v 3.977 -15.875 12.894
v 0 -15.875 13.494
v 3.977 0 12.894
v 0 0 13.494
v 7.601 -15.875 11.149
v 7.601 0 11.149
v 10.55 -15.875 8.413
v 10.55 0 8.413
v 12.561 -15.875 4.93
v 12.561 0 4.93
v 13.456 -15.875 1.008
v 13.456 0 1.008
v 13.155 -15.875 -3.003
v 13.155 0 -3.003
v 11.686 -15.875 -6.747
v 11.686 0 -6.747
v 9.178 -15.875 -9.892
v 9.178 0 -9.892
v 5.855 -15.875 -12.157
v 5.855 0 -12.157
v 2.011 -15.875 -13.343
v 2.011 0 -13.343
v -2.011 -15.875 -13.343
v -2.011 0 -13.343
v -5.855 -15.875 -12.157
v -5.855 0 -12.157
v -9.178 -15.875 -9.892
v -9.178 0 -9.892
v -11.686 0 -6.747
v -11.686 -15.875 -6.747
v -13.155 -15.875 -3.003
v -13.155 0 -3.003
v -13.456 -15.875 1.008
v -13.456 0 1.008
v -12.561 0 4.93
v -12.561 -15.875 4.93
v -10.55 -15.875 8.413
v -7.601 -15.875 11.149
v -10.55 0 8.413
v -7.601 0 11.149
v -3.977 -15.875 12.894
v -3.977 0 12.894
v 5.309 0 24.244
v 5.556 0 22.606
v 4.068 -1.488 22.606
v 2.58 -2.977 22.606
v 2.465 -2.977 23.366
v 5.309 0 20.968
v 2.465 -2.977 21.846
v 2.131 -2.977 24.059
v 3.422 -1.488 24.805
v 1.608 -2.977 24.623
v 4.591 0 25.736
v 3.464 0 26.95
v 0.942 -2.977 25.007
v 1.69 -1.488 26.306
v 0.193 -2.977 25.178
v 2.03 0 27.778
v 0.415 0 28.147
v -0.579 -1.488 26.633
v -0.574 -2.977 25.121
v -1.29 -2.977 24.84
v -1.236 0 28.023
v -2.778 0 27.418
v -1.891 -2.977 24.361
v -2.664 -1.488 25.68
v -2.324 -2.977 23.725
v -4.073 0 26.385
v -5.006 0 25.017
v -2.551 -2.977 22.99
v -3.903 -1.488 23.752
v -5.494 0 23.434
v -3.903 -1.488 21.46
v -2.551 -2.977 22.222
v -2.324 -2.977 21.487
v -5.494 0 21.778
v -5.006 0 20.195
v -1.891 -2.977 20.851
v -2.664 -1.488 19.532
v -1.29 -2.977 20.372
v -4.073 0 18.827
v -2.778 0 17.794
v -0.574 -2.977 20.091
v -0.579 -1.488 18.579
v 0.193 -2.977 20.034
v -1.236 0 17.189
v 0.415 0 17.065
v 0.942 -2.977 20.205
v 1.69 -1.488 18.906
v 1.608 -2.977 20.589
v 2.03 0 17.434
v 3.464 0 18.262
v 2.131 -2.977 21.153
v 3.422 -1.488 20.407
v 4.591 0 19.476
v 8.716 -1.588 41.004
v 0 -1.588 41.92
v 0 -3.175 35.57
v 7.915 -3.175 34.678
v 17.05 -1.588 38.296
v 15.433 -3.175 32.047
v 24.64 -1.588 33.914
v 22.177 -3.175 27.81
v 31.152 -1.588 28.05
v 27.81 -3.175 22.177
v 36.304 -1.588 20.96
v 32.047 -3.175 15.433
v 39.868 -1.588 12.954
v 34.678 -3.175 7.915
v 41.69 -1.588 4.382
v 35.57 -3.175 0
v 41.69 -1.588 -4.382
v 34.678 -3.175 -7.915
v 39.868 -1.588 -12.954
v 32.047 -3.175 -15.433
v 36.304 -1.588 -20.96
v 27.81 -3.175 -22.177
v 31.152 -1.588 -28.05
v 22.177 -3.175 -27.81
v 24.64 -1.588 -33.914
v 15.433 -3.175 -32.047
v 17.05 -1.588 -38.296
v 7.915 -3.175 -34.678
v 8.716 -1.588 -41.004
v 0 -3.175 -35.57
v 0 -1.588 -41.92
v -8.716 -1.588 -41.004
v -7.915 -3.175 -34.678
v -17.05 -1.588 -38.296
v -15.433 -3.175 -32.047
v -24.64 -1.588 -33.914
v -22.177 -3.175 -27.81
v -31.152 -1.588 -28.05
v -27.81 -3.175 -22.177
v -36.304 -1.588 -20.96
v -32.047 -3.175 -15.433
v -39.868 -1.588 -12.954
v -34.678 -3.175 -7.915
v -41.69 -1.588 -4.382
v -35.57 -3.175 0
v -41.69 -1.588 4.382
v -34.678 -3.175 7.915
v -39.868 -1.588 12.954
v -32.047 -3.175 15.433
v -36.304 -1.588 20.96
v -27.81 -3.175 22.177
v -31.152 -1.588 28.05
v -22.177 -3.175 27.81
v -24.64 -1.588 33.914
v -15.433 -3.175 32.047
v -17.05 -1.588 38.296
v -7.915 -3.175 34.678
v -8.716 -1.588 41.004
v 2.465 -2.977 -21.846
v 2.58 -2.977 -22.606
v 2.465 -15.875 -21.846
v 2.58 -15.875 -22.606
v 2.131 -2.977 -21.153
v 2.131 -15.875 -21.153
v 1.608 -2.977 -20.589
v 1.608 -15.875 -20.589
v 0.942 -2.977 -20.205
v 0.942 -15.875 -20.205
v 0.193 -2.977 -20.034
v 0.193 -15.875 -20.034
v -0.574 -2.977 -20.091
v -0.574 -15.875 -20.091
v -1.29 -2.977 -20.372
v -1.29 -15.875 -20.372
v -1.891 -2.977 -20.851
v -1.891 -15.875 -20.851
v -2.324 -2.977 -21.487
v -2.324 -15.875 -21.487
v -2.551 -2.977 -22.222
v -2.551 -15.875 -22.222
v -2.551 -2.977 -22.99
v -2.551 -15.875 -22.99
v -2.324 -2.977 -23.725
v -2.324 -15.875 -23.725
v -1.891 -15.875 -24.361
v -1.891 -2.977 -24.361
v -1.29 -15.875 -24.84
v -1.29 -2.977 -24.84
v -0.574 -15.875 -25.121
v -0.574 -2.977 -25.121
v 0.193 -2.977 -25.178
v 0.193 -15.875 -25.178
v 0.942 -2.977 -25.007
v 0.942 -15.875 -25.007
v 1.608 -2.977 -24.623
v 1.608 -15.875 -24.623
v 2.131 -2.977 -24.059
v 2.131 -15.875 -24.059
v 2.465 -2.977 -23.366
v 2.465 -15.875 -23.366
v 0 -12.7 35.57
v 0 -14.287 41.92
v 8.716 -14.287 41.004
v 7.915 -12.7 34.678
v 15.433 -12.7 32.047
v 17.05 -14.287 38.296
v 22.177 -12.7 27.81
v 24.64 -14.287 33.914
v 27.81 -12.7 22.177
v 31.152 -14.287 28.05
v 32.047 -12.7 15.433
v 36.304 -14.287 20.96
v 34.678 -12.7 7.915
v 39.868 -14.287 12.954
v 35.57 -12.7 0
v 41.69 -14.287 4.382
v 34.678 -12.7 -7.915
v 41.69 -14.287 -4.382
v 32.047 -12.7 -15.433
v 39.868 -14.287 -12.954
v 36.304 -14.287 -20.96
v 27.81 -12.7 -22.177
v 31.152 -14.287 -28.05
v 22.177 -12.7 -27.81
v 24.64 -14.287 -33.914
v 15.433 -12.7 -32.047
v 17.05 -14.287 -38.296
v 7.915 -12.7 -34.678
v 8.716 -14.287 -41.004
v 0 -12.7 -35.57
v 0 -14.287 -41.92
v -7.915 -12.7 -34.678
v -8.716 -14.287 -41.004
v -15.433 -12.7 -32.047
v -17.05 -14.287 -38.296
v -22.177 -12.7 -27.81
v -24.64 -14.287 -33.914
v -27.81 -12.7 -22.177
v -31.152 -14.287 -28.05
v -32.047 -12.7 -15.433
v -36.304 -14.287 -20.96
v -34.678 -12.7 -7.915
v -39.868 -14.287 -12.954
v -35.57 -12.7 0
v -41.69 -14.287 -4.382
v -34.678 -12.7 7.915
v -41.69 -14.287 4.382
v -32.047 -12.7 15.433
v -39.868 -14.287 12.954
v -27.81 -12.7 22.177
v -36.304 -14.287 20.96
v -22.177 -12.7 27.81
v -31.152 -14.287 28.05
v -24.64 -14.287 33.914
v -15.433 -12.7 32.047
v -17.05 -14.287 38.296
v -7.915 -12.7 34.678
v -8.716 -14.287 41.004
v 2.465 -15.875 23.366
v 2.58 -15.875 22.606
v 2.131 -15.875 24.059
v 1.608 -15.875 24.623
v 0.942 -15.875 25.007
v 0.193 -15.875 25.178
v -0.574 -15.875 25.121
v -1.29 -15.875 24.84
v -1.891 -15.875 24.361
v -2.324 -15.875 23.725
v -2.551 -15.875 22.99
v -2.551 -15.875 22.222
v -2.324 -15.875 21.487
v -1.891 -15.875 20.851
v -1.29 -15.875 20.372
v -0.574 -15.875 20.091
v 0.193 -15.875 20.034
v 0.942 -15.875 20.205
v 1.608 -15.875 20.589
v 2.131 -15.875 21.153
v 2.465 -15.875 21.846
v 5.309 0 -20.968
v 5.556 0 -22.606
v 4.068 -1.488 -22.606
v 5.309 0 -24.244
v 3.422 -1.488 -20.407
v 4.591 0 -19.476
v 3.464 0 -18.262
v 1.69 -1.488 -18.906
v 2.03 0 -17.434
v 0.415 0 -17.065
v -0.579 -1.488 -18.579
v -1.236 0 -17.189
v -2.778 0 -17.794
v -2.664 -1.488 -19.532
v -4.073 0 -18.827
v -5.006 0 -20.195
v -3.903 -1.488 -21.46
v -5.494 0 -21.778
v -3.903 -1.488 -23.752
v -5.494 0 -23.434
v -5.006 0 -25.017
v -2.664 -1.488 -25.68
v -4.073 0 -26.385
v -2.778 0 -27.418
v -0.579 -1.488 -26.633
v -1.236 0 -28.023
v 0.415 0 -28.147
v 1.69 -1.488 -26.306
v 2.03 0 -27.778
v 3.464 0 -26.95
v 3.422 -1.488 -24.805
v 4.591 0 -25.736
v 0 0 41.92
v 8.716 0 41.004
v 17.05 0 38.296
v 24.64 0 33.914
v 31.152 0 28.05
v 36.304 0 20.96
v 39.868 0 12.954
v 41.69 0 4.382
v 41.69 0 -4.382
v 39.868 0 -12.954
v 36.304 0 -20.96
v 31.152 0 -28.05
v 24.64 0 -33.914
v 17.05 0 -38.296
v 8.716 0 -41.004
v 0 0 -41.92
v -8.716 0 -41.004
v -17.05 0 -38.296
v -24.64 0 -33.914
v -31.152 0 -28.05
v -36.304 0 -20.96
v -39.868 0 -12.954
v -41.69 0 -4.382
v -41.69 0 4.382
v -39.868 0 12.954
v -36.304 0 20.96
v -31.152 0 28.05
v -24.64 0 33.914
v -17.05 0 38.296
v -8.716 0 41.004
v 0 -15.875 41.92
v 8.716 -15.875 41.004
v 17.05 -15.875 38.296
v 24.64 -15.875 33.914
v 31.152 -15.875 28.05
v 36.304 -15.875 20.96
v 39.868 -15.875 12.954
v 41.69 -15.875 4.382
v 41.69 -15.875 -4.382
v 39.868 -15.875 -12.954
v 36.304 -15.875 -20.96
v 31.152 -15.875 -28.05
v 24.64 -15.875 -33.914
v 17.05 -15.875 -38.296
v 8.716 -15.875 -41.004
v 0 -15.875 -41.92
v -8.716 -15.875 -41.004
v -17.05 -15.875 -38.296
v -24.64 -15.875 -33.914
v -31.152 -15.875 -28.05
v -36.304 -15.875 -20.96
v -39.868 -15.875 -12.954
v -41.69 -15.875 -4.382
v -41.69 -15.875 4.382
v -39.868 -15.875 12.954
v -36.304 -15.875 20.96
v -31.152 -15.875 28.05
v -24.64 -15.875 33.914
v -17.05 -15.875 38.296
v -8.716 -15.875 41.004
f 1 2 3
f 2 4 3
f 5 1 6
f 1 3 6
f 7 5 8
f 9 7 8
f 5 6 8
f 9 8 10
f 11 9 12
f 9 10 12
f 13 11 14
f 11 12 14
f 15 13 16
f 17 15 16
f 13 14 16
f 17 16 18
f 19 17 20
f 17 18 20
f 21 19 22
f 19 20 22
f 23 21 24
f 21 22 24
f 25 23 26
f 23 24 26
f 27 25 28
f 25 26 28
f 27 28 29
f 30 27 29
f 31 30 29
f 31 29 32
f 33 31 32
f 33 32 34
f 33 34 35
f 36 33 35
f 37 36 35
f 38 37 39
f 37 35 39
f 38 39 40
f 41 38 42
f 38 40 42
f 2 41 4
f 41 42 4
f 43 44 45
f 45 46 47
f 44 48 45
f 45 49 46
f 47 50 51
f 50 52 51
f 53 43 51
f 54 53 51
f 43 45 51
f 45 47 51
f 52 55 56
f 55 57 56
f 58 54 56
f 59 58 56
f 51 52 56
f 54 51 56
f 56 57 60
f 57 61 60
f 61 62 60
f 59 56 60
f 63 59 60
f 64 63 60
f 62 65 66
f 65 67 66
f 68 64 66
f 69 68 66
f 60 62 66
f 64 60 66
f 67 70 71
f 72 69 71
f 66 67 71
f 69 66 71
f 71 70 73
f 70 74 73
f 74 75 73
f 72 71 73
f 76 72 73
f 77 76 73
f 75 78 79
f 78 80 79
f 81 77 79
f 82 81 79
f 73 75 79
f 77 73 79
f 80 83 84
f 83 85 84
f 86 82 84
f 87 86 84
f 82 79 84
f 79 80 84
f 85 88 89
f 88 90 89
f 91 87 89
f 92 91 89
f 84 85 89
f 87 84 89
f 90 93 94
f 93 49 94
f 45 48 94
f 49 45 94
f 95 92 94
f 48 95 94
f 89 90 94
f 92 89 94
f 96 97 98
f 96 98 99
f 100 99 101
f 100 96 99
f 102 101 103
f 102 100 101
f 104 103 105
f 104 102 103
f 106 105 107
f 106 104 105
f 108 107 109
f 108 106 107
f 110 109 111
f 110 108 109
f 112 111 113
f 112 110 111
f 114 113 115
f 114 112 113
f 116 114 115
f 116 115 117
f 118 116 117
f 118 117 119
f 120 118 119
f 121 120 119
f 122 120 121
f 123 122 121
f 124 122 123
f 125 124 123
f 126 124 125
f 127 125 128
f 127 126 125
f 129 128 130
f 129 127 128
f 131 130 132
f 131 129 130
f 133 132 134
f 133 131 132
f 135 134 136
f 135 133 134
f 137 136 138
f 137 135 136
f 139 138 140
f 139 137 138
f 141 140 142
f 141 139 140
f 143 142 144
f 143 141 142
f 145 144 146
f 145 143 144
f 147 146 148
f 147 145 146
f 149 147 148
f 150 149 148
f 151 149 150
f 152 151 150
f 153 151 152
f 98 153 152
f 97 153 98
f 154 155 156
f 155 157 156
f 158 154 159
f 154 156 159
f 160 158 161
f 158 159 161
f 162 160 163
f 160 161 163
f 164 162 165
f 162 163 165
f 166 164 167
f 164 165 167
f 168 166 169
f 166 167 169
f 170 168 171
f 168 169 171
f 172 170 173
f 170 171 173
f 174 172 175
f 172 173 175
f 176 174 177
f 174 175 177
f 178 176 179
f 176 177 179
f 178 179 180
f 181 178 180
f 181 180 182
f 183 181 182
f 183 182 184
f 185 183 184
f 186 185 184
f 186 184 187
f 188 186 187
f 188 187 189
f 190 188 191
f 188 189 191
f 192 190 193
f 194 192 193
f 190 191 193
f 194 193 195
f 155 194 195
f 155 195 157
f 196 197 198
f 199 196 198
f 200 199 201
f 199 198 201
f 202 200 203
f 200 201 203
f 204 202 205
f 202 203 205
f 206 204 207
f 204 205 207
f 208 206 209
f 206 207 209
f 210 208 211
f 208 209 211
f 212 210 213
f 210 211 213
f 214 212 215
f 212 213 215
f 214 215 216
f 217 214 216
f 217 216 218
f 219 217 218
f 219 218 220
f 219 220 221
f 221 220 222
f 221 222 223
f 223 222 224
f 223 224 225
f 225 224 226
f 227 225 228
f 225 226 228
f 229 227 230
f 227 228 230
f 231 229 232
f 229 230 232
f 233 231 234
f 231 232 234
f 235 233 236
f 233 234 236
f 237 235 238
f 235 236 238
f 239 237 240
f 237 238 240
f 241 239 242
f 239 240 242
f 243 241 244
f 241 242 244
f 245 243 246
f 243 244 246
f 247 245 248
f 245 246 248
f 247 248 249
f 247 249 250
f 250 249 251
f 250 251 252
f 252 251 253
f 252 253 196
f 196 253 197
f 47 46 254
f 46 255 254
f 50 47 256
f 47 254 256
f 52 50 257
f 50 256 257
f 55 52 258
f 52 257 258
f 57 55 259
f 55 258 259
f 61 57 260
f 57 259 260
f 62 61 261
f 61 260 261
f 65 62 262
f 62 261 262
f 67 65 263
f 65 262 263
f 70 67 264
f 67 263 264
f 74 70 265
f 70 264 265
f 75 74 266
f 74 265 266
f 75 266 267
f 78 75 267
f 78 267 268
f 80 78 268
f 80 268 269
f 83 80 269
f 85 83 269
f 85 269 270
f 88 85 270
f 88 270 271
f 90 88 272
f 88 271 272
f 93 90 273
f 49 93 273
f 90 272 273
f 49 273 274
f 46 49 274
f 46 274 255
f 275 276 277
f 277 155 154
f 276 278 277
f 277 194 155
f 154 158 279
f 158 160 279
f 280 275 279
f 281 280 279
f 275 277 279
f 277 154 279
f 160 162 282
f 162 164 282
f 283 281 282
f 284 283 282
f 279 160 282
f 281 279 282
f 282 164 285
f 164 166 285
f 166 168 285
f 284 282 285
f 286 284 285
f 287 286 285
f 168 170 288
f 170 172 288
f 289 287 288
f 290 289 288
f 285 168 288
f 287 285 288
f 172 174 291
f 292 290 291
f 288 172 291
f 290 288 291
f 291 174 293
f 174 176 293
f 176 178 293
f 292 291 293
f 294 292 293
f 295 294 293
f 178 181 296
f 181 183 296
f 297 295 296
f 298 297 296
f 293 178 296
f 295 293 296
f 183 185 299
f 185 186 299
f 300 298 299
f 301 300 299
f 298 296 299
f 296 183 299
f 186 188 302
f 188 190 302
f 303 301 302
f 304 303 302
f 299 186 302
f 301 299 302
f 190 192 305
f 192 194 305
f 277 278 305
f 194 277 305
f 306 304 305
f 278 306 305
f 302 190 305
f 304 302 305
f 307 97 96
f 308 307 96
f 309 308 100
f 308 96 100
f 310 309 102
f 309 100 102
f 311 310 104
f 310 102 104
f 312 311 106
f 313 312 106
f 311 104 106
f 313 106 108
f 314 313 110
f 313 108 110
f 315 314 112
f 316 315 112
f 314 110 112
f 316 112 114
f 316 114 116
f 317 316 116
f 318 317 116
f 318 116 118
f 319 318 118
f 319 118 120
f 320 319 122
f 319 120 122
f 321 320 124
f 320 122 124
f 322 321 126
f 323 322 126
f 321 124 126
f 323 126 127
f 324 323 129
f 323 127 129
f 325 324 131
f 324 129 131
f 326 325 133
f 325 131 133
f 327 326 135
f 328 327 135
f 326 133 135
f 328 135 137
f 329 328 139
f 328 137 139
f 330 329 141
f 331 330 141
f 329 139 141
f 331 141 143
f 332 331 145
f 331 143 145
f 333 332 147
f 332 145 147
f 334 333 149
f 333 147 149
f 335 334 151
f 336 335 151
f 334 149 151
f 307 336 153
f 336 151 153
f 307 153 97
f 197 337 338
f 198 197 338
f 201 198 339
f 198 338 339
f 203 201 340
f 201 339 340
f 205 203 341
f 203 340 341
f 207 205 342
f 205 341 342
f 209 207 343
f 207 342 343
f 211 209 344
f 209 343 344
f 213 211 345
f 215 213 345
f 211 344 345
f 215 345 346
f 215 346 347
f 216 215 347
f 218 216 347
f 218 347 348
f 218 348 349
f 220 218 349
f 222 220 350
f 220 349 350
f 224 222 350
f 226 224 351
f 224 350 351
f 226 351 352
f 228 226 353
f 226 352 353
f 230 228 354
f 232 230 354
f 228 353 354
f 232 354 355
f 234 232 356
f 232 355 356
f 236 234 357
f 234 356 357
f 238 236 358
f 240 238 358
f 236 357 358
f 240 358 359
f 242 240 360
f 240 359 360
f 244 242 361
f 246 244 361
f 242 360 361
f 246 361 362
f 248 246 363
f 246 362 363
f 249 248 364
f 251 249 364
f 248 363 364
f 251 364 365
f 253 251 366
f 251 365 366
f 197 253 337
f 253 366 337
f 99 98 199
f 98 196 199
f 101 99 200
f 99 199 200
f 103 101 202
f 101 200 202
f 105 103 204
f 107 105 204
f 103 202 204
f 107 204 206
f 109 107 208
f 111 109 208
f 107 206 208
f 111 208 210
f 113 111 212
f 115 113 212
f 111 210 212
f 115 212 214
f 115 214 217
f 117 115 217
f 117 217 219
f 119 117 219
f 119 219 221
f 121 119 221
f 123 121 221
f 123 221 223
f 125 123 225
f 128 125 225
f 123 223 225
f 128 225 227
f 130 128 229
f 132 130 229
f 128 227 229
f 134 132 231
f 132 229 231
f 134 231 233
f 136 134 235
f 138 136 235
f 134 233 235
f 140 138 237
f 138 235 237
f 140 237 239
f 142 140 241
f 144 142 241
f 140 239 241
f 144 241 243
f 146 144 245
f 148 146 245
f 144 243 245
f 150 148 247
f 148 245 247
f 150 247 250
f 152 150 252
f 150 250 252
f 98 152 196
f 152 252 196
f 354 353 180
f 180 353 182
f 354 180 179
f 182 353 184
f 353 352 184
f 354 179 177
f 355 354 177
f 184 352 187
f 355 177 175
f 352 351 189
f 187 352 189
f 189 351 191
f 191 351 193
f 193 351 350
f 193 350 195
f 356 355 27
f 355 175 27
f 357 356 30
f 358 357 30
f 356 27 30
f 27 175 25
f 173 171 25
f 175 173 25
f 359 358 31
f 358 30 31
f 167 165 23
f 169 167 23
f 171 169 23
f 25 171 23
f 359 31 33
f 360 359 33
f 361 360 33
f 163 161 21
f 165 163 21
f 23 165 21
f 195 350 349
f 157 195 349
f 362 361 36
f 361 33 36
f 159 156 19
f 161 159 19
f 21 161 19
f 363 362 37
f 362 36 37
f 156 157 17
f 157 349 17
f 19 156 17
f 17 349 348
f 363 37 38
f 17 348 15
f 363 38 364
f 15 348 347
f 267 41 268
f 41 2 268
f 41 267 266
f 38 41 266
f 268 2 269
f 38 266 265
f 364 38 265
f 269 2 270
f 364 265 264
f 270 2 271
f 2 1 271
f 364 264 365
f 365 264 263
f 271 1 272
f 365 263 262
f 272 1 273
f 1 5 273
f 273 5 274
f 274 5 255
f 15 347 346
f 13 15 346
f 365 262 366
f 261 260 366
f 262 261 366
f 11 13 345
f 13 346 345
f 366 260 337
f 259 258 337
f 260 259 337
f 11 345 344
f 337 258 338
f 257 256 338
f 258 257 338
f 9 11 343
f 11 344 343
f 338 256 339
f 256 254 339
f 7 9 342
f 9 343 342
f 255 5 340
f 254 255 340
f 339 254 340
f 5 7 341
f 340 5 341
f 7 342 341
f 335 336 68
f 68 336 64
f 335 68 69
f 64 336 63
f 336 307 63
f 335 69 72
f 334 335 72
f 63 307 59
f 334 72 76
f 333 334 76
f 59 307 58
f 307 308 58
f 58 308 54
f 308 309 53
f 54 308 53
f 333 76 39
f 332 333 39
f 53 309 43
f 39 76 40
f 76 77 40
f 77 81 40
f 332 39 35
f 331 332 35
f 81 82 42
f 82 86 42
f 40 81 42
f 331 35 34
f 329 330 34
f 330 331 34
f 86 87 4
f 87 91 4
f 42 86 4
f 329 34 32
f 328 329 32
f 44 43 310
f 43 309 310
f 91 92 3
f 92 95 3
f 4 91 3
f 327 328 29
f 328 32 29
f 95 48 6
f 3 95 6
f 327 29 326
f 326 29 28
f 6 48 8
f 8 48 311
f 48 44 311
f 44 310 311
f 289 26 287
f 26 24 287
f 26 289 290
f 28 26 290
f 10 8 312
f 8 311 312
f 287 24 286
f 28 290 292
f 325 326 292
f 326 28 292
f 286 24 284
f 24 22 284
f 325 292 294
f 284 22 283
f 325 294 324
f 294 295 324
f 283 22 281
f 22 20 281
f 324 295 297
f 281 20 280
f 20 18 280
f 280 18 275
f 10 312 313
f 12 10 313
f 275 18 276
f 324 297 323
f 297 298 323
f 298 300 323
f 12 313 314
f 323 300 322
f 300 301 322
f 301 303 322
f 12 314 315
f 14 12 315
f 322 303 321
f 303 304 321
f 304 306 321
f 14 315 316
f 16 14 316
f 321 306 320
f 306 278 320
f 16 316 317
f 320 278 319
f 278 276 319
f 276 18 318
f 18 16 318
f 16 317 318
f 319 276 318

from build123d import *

# Parameters (mm, degrees)
F2_SIZE2       = 1.58749
F2_SIZE        = 6.34999
F3_SIZE2       = 1.58749
F3_SIZE        = 6.34999
F5_D           = 5.159375
F5_CSINK_D     = 11.1125
F5_CSINK_ANGLE = 90


# Not quite as in the source:
# - a fillet or chamfer is up to 0.001 mm smaller than in the source, because OpenCascade refuses the exact size


with BuildPart() as f1:
    # F0 (on Right) → F1 (revolve)
    with BuildSketch(Plane.YZ):
        Polygon((-15.875, 13.49375), (0, 13.49375), (0, 41.9197008275), (-3.175, 41.9197008275), (-3.175, 35.5697008275), (-12.7, 35.5697008275), (-12.7, 41.9197008275), (-15.875, 41.9197008275), align=None)
    revolve(axis=Axis((0, -7.9375, 0), (0, 1, 0)))

    # F2 (size 6.35 and 1.5875 in the source; OpenCascade refuses exactly that, so slightly less here)
    f2_edges = [f1.edges().sort_by_distance(p)[0] for p in [
        (0, -12.7, -41.919701),
    ]]
    f2_side = f1.faces().sort_by_distance((0, -12.7, -36.755369))[0]
    chamfer(f2_edges, length=F2_SIZE, length2=F2_SIZE2, reference=f2_side)

    # F3 (size 6.35 and 1.5875 in the source; OpenCascade refuses exactly that, so slightly less here)
    f3_edges = [f1.edges().sort_by_distance(p)[0] for p in [
        (0, -3.175, -41.919701),
    ]]
    chamfer(f3_edges, length=F3_SIZE, length2=F3_SIZE2)

    # F5 (through all)
    with Locations(Plane(origin=(0, 0, 0), x_dir=(-1, 0, 0), z_dir=(0, 1, 0))):
        with Locations((0, 22.606), (0, -22.606)):
            CounterSinkHole(F5_D / 2, F5_CSINK_D / 2, counter_sink_angle=F5_CSINK_ANGLE)


solid = f1.part
